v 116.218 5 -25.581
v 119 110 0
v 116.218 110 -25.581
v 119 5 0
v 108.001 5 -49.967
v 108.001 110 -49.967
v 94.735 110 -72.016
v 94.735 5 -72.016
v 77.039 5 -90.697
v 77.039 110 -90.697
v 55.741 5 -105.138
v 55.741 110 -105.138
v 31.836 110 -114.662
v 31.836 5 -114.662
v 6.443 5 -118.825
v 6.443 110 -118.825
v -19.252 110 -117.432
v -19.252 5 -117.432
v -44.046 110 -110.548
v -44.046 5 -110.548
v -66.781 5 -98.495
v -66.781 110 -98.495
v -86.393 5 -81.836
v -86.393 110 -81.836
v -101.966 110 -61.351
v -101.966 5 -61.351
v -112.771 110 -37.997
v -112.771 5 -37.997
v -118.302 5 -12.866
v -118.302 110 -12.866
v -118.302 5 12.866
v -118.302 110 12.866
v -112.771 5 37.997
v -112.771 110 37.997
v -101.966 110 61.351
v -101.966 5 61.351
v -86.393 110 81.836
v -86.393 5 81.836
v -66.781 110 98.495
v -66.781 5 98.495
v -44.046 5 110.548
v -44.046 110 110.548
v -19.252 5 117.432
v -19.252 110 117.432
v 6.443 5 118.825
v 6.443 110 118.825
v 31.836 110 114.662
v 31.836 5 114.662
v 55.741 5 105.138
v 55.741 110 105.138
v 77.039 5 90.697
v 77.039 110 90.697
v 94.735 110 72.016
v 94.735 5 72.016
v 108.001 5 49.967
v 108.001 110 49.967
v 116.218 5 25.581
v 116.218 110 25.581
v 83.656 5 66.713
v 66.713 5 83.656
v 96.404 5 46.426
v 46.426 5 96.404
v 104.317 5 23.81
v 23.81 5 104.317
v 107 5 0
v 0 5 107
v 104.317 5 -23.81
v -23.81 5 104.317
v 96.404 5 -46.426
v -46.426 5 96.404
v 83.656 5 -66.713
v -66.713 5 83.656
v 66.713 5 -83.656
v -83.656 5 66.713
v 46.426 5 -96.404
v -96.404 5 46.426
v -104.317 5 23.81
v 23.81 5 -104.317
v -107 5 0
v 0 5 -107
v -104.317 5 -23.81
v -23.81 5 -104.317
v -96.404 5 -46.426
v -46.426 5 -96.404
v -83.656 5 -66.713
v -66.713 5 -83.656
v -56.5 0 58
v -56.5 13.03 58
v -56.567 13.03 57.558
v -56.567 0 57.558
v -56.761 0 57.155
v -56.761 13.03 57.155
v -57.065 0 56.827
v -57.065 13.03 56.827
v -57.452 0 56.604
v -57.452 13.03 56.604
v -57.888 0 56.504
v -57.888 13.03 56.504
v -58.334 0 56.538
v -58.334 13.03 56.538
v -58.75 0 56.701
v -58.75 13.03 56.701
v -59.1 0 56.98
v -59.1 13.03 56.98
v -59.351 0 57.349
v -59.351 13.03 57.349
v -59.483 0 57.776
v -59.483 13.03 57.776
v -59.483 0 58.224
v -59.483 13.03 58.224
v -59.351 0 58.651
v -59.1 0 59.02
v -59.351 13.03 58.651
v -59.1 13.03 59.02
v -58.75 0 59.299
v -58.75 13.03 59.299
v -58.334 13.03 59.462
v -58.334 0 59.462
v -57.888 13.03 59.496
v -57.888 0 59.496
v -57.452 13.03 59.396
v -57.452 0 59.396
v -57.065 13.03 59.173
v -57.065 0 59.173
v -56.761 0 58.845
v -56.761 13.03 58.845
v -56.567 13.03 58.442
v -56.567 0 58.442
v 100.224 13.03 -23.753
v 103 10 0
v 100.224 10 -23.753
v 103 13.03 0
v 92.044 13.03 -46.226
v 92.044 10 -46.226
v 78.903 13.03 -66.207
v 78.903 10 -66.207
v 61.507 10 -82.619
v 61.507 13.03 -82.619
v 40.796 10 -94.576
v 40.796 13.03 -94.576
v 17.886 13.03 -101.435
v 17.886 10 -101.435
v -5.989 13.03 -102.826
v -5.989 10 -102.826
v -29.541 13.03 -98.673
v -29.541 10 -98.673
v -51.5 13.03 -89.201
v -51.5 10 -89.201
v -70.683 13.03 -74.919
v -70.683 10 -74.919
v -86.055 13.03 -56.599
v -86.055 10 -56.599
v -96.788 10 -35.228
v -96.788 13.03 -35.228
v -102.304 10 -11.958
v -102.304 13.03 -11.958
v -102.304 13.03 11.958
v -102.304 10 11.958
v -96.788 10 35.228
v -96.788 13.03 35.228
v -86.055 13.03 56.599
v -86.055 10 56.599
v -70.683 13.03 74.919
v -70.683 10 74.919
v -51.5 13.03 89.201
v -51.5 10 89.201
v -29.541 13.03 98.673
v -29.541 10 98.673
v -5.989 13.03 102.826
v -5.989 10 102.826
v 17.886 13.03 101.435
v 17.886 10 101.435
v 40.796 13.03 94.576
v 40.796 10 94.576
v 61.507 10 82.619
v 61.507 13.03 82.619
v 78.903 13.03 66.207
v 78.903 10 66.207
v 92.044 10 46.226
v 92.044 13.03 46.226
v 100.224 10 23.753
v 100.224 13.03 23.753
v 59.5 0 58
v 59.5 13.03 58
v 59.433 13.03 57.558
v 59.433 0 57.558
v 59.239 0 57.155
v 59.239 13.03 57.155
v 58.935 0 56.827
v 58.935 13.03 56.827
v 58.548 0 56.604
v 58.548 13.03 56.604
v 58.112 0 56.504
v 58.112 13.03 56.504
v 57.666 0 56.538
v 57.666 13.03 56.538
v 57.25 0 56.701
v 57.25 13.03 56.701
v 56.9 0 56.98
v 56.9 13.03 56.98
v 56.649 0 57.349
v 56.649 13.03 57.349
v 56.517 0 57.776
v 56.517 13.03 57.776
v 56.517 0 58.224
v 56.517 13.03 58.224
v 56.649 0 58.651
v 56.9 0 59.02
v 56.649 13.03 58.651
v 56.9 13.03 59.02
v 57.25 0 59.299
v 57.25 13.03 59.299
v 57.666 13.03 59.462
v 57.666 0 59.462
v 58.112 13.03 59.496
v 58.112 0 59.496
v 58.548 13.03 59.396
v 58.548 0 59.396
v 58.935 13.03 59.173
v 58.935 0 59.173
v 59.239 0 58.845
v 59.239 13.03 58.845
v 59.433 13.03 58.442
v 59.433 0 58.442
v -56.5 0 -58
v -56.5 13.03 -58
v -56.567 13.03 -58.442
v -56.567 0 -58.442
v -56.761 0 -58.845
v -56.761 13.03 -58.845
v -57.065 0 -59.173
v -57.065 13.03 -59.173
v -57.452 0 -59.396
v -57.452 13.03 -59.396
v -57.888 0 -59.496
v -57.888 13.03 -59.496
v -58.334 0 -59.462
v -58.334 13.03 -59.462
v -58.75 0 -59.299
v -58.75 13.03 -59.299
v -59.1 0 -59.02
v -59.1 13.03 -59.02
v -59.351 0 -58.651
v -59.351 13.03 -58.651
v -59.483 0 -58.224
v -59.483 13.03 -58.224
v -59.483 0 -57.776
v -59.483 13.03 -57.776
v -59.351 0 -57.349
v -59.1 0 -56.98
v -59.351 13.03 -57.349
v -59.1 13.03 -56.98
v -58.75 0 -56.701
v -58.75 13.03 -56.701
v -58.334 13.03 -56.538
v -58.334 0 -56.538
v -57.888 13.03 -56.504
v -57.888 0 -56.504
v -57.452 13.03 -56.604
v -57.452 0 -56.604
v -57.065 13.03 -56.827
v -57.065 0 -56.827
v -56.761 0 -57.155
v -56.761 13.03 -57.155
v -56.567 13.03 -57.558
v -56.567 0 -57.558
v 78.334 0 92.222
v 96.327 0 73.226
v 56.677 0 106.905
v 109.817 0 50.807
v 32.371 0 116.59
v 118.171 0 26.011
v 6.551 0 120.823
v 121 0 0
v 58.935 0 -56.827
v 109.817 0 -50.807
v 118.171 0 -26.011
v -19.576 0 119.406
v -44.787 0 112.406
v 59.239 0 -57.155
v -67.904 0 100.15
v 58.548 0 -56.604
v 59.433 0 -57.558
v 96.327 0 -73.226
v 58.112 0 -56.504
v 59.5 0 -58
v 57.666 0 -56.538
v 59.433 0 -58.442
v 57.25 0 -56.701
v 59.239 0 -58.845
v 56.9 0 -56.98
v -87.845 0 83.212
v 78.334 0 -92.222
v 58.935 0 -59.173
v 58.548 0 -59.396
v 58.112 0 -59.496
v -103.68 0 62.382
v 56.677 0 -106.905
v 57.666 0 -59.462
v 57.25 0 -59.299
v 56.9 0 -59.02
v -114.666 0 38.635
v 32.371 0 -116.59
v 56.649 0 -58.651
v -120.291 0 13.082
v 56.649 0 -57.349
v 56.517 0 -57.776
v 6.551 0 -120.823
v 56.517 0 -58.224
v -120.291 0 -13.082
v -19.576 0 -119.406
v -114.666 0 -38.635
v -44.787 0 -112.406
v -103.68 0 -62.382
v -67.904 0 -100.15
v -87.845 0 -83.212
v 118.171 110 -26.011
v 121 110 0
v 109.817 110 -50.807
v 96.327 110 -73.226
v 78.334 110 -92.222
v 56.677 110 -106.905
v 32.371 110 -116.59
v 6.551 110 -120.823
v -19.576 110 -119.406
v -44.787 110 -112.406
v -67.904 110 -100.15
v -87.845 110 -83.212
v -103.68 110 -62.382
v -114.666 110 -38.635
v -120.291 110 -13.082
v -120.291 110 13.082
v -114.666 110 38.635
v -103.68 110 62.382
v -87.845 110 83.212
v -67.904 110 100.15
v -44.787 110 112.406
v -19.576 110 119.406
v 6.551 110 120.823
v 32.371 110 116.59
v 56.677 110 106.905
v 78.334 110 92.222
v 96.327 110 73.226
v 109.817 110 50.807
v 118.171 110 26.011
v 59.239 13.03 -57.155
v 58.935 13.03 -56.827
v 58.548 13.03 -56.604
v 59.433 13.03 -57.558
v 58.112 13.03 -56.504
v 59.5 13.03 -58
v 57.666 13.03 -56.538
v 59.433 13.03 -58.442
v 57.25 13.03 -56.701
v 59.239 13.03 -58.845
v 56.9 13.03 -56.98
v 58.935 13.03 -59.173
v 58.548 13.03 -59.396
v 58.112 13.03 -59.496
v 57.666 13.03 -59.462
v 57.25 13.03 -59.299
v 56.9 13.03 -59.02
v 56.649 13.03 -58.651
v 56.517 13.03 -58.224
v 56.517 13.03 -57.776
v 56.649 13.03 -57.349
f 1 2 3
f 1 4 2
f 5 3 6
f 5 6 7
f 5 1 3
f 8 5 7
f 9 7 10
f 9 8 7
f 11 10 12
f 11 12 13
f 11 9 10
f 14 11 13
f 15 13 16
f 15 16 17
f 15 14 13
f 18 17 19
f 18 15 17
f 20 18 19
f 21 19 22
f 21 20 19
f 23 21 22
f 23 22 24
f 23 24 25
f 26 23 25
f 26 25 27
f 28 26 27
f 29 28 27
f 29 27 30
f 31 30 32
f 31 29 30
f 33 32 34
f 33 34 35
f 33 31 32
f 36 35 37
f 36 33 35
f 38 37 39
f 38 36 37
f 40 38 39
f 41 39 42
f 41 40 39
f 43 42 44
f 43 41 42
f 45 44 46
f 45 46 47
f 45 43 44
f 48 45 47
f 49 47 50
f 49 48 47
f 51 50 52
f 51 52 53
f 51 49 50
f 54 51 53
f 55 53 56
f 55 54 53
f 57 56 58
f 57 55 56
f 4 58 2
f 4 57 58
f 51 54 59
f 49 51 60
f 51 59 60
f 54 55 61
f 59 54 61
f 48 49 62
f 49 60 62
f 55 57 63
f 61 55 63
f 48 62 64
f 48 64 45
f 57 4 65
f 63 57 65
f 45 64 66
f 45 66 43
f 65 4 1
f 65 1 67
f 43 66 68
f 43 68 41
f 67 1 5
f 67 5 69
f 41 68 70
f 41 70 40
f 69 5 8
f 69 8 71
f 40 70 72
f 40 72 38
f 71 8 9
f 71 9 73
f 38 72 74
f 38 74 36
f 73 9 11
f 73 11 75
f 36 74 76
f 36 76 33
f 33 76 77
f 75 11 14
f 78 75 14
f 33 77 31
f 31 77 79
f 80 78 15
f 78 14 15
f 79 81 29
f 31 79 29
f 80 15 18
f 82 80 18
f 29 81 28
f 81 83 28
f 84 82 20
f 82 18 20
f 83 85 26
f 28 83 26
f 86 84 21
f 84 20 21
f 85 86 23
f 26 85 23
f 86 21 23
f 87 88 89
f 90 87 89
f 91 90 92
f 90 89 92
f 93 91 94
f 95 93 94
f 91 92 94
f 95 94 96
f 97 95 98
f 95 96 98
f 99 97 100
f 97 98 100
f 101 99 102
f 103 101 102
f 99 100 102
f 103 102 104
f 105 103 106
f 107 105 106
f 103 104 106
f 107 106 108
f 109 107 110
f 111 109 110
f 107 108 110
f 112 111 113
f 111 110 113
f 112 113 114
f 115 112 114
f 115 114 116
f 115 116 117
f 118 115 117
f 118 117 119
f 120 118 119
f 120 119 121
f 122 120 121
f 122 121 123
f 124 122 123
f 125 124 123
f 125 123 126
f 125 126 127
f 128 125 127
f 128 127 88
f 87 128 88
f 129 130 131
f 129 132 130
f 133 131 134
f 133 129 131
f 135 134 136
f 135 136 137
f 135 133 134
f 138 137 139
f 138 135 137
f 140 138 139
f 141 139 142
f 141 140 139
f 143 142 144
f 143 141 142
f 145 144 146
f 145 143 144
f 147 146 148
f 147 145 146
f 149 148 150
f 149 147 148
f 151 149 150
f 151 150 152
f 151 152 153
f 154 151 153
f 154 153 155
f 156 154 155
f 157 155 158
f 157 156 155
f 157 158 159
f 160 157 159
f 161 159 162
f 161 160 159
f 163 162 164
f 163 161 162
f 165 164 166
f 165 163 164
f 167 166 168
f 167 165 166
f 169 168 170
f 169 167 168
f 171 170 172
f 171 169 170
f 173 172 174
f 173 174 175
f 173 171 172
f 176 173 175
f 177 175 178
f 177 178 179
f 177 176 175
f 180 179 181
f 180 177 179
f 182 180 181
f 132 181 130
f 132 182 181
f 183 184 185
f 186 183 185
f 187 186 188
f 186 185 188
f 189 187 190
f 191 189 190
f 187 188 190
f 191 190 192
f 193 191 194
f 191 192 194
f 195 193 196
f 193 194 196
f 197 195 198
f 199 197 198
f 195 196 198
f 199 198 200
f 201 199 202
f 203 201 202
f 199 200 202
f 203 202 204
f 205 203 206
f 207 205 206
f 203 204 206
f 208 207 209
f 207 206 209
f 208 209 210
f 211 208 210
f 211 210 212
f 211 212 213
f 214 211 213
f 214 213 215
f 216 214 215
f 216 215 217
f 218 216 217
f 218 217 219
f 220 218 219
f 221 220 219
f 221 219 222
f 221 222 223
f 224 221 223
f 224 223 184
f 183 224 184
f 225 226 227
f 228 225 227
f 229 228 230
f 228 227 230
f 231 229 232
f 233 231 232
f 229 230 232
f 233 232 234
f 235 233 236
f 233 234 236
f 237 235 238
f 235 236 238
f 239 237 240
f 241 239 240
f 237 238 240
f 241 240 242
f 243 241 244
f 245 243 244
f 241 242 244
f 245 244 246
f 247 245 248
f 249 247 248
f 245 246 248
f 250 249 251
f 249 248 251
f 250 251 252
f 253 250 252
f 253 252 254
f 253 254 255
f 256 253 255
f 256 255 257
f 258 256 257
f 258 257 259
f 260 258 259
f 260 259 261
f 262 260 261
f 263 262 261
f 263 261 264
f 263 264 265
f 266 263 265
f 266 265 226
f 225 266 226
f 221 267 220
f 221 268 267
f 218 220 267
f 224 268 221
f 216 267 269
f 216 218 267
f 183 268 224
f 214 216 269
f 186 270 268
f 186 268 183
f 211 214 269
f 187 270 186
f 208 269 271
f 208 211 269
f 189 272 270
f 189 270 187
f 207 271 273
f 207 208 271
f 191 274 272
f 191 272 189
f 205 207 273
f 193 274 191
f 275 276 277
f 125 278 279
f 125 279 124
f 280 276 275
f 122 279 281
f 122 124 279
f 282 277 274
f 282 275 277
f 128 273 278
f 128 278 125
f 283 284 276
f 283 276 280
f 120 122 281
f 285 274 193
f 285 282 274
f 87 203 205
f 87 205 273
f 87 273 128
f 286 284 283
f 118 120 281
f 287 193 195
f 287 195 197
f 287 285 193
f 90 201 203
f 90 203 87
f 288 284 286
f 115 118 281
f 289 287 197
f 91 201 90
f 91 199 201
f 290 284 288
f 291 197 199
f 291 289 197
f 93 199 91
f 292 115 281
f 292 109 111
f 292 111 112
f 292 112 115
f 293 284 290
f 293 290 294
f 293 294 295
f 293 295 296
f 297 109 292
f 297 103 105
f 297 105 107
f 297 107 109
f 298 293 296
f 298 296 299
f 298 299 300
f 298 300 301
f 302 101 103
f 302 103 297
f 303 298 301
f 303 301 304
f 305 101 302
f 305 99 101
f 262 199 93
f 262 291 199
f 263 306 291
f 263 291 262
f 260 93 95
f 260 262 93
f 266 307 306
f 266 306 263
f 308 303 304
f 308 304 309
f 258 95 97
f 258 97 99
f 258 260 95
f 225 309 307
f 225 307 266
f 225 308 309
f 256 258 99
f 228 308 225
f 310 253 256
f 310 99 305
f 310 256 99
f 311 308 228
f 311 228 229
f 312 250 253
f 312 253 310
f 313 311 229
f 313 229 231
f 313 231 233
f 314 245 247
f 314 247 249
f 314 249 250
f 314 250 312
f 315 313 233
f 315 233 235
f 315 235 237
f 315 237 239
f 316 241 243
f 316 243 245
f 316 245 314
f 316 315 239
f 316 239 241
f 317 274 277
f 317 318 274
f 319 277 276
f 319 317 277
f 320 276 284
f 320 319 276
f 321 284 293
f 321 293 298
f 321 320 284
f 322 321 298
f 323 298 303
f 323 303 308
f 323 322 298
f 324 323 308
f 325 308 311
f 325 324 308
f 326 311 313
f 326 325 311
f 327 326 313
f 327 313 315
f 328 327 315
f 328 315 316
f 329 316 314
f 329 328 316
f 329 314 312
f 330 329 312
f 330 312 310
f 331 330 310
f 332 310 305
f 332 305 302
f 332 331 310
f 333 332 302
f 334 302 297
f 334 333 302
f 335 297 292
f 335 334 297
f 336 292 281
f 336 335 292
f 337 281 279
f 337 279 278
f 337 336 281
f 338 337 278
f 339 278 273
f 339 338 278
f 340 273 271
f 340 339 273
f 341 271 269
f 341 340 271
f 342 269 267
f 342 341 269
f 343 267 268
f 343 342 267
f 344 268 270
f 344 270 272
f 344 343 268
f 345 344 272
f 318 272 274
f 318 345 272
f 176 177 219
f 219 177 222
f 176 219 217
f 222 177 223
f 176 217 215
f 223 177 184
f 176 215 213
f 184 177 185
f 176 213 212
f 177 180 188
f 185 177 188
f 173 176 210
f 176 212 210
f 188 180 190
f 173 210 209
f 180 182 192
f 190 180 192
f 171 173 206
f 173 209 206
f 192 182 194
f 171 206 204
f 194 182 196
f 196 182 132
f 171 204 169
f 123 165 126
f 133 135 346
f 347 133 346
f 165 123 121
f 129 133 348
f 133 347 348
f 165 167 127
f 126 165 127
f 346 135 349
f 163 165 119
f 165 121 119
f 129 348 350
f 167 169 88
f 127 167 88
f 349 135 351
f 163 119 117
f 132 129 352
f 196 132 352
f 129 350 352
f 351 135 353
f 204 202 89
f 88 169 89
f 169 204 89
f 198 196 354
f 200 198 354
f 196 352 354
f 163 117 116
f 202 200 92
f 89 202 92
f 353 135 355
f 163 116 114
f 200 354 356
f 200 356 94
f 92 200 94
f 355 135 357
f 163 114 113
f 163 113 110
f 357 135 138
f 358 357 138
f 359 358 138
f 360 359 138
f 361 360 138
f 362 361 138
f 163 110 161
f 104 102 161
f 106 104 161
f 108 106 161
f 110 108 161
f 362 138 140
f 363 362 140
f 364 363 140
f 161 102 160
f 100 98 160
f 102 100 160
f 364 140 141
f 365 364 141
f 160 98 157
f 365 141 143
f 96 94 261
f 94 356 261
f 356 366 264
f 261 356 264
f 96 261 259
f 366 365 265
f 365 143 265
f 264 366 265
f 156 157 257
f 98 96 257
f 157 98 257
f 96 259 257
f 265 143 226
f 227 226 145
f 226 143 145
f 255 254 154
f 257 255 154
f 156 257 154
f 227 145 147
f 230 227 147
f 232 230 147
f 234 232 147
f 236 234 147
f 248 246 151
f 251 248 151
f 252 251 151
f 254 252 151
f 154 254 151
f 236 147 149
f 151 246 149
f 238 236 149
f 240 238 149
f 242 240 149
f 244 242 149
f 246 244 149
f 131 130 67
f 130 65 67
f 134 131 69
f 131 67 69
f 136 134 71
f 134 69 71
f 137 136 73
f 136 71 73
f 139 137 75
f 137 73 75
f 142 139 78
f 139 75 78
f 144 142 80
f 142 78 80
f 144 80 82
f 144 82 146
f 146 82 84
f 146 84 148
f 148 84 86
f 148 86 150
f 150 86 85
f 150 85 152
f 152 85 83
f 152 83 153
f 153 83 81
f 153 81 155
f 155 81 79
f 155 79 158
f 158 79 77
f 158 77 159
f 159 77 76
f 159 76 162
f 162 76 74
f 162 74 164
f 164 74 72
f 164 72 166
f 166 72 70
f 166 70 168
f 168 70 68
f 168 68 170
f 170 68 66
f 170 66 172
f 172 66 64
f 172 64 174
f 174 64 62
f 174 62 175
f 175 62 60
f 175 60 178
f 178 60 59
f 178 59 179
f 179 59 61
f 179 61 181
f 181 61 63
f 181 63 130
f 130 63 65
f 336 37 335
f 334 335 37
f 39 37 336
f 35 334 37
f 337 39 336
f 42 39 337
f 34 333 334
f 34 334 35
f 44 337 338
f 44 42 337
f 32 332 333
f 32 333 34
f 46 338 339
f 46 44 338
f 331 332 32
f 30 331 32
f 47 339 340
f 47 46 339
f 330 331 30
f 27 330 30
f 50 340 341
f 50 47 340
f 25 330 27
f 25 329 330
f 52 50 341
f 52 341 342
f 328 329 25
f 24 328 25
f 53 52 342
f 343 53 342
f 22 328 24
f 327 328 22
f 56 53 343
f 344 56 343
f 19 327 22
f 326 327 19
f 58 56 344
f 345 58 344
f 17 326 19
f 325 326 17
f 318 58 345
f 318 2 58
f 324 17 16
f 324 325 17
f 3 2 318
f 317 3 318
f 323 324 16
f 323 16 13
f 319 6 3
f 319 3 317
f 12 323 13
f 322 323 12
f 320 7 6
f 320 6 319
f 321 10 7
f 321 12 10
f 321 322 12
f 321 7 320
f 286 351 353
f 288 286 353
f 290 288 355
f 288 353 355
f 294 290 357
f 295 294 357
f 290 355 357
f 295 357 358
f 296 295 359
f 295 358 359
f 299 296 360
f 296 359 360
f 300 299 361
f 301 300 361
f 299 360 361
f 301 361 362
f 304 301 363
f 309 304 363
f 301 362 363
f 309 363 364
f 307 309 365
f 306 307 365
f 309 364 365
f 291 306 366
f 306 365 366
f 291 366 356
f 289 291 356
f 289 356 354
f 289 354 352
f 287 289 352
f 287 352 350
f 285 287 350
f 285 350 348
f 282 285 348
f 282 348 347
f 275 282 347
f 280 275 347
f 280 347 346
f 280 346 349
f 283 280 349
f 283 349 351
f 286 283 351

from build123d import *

# Parameters (mm, degrees)
SKETCH_1_W          = 103
SKETCH_1_H          = 3.03
SKETCH_2_R          = 1.5
CUT_EXTRUDE_1_DEPTH = 14.03


with BuildPart() as part:
    # Эскиз1 → Повернуть1 (revolve)
    with BuildSketch(Plane.XY):
        Polygon((0, 0), (0, 10), (103, 10), (107, 5), (119, 5), (119, 0), align=None)
        with Locations((51.5, 11.515)):
            Rectangle(SKETCH_1_W, SKETCH_1_H)
        Polygon((119, 5), (119, 0), (121, 0), (121, 110), (119, 110), align=None)
    revolve(axis=Axis((0, 0, 0), (0, 1, 0)))

    # Эскиз2 → Вырез-Вытянуть1 (cut, through all)
    with BuildSketch(Plane(origin=(0, 13.03, 0), x_dir=(1, 0, 0), z_dir=(0, 1, 0))):
        with Locations((-58, 58)):
            Circle(SKETCH_2_R)
        with Locations((58, 58)):
            Circle(SKETCH_2_R)
        with Locations((58, -58)):
            Circle(SKETCH_2_R)
        with Locations((-58, -58)):
            Circle(SKETCH_2_R)
    extrude(amount=-CUT_EXTRUDE_1_DEPTH, mode=Mode.SUBTRACT)


solid = part.part
